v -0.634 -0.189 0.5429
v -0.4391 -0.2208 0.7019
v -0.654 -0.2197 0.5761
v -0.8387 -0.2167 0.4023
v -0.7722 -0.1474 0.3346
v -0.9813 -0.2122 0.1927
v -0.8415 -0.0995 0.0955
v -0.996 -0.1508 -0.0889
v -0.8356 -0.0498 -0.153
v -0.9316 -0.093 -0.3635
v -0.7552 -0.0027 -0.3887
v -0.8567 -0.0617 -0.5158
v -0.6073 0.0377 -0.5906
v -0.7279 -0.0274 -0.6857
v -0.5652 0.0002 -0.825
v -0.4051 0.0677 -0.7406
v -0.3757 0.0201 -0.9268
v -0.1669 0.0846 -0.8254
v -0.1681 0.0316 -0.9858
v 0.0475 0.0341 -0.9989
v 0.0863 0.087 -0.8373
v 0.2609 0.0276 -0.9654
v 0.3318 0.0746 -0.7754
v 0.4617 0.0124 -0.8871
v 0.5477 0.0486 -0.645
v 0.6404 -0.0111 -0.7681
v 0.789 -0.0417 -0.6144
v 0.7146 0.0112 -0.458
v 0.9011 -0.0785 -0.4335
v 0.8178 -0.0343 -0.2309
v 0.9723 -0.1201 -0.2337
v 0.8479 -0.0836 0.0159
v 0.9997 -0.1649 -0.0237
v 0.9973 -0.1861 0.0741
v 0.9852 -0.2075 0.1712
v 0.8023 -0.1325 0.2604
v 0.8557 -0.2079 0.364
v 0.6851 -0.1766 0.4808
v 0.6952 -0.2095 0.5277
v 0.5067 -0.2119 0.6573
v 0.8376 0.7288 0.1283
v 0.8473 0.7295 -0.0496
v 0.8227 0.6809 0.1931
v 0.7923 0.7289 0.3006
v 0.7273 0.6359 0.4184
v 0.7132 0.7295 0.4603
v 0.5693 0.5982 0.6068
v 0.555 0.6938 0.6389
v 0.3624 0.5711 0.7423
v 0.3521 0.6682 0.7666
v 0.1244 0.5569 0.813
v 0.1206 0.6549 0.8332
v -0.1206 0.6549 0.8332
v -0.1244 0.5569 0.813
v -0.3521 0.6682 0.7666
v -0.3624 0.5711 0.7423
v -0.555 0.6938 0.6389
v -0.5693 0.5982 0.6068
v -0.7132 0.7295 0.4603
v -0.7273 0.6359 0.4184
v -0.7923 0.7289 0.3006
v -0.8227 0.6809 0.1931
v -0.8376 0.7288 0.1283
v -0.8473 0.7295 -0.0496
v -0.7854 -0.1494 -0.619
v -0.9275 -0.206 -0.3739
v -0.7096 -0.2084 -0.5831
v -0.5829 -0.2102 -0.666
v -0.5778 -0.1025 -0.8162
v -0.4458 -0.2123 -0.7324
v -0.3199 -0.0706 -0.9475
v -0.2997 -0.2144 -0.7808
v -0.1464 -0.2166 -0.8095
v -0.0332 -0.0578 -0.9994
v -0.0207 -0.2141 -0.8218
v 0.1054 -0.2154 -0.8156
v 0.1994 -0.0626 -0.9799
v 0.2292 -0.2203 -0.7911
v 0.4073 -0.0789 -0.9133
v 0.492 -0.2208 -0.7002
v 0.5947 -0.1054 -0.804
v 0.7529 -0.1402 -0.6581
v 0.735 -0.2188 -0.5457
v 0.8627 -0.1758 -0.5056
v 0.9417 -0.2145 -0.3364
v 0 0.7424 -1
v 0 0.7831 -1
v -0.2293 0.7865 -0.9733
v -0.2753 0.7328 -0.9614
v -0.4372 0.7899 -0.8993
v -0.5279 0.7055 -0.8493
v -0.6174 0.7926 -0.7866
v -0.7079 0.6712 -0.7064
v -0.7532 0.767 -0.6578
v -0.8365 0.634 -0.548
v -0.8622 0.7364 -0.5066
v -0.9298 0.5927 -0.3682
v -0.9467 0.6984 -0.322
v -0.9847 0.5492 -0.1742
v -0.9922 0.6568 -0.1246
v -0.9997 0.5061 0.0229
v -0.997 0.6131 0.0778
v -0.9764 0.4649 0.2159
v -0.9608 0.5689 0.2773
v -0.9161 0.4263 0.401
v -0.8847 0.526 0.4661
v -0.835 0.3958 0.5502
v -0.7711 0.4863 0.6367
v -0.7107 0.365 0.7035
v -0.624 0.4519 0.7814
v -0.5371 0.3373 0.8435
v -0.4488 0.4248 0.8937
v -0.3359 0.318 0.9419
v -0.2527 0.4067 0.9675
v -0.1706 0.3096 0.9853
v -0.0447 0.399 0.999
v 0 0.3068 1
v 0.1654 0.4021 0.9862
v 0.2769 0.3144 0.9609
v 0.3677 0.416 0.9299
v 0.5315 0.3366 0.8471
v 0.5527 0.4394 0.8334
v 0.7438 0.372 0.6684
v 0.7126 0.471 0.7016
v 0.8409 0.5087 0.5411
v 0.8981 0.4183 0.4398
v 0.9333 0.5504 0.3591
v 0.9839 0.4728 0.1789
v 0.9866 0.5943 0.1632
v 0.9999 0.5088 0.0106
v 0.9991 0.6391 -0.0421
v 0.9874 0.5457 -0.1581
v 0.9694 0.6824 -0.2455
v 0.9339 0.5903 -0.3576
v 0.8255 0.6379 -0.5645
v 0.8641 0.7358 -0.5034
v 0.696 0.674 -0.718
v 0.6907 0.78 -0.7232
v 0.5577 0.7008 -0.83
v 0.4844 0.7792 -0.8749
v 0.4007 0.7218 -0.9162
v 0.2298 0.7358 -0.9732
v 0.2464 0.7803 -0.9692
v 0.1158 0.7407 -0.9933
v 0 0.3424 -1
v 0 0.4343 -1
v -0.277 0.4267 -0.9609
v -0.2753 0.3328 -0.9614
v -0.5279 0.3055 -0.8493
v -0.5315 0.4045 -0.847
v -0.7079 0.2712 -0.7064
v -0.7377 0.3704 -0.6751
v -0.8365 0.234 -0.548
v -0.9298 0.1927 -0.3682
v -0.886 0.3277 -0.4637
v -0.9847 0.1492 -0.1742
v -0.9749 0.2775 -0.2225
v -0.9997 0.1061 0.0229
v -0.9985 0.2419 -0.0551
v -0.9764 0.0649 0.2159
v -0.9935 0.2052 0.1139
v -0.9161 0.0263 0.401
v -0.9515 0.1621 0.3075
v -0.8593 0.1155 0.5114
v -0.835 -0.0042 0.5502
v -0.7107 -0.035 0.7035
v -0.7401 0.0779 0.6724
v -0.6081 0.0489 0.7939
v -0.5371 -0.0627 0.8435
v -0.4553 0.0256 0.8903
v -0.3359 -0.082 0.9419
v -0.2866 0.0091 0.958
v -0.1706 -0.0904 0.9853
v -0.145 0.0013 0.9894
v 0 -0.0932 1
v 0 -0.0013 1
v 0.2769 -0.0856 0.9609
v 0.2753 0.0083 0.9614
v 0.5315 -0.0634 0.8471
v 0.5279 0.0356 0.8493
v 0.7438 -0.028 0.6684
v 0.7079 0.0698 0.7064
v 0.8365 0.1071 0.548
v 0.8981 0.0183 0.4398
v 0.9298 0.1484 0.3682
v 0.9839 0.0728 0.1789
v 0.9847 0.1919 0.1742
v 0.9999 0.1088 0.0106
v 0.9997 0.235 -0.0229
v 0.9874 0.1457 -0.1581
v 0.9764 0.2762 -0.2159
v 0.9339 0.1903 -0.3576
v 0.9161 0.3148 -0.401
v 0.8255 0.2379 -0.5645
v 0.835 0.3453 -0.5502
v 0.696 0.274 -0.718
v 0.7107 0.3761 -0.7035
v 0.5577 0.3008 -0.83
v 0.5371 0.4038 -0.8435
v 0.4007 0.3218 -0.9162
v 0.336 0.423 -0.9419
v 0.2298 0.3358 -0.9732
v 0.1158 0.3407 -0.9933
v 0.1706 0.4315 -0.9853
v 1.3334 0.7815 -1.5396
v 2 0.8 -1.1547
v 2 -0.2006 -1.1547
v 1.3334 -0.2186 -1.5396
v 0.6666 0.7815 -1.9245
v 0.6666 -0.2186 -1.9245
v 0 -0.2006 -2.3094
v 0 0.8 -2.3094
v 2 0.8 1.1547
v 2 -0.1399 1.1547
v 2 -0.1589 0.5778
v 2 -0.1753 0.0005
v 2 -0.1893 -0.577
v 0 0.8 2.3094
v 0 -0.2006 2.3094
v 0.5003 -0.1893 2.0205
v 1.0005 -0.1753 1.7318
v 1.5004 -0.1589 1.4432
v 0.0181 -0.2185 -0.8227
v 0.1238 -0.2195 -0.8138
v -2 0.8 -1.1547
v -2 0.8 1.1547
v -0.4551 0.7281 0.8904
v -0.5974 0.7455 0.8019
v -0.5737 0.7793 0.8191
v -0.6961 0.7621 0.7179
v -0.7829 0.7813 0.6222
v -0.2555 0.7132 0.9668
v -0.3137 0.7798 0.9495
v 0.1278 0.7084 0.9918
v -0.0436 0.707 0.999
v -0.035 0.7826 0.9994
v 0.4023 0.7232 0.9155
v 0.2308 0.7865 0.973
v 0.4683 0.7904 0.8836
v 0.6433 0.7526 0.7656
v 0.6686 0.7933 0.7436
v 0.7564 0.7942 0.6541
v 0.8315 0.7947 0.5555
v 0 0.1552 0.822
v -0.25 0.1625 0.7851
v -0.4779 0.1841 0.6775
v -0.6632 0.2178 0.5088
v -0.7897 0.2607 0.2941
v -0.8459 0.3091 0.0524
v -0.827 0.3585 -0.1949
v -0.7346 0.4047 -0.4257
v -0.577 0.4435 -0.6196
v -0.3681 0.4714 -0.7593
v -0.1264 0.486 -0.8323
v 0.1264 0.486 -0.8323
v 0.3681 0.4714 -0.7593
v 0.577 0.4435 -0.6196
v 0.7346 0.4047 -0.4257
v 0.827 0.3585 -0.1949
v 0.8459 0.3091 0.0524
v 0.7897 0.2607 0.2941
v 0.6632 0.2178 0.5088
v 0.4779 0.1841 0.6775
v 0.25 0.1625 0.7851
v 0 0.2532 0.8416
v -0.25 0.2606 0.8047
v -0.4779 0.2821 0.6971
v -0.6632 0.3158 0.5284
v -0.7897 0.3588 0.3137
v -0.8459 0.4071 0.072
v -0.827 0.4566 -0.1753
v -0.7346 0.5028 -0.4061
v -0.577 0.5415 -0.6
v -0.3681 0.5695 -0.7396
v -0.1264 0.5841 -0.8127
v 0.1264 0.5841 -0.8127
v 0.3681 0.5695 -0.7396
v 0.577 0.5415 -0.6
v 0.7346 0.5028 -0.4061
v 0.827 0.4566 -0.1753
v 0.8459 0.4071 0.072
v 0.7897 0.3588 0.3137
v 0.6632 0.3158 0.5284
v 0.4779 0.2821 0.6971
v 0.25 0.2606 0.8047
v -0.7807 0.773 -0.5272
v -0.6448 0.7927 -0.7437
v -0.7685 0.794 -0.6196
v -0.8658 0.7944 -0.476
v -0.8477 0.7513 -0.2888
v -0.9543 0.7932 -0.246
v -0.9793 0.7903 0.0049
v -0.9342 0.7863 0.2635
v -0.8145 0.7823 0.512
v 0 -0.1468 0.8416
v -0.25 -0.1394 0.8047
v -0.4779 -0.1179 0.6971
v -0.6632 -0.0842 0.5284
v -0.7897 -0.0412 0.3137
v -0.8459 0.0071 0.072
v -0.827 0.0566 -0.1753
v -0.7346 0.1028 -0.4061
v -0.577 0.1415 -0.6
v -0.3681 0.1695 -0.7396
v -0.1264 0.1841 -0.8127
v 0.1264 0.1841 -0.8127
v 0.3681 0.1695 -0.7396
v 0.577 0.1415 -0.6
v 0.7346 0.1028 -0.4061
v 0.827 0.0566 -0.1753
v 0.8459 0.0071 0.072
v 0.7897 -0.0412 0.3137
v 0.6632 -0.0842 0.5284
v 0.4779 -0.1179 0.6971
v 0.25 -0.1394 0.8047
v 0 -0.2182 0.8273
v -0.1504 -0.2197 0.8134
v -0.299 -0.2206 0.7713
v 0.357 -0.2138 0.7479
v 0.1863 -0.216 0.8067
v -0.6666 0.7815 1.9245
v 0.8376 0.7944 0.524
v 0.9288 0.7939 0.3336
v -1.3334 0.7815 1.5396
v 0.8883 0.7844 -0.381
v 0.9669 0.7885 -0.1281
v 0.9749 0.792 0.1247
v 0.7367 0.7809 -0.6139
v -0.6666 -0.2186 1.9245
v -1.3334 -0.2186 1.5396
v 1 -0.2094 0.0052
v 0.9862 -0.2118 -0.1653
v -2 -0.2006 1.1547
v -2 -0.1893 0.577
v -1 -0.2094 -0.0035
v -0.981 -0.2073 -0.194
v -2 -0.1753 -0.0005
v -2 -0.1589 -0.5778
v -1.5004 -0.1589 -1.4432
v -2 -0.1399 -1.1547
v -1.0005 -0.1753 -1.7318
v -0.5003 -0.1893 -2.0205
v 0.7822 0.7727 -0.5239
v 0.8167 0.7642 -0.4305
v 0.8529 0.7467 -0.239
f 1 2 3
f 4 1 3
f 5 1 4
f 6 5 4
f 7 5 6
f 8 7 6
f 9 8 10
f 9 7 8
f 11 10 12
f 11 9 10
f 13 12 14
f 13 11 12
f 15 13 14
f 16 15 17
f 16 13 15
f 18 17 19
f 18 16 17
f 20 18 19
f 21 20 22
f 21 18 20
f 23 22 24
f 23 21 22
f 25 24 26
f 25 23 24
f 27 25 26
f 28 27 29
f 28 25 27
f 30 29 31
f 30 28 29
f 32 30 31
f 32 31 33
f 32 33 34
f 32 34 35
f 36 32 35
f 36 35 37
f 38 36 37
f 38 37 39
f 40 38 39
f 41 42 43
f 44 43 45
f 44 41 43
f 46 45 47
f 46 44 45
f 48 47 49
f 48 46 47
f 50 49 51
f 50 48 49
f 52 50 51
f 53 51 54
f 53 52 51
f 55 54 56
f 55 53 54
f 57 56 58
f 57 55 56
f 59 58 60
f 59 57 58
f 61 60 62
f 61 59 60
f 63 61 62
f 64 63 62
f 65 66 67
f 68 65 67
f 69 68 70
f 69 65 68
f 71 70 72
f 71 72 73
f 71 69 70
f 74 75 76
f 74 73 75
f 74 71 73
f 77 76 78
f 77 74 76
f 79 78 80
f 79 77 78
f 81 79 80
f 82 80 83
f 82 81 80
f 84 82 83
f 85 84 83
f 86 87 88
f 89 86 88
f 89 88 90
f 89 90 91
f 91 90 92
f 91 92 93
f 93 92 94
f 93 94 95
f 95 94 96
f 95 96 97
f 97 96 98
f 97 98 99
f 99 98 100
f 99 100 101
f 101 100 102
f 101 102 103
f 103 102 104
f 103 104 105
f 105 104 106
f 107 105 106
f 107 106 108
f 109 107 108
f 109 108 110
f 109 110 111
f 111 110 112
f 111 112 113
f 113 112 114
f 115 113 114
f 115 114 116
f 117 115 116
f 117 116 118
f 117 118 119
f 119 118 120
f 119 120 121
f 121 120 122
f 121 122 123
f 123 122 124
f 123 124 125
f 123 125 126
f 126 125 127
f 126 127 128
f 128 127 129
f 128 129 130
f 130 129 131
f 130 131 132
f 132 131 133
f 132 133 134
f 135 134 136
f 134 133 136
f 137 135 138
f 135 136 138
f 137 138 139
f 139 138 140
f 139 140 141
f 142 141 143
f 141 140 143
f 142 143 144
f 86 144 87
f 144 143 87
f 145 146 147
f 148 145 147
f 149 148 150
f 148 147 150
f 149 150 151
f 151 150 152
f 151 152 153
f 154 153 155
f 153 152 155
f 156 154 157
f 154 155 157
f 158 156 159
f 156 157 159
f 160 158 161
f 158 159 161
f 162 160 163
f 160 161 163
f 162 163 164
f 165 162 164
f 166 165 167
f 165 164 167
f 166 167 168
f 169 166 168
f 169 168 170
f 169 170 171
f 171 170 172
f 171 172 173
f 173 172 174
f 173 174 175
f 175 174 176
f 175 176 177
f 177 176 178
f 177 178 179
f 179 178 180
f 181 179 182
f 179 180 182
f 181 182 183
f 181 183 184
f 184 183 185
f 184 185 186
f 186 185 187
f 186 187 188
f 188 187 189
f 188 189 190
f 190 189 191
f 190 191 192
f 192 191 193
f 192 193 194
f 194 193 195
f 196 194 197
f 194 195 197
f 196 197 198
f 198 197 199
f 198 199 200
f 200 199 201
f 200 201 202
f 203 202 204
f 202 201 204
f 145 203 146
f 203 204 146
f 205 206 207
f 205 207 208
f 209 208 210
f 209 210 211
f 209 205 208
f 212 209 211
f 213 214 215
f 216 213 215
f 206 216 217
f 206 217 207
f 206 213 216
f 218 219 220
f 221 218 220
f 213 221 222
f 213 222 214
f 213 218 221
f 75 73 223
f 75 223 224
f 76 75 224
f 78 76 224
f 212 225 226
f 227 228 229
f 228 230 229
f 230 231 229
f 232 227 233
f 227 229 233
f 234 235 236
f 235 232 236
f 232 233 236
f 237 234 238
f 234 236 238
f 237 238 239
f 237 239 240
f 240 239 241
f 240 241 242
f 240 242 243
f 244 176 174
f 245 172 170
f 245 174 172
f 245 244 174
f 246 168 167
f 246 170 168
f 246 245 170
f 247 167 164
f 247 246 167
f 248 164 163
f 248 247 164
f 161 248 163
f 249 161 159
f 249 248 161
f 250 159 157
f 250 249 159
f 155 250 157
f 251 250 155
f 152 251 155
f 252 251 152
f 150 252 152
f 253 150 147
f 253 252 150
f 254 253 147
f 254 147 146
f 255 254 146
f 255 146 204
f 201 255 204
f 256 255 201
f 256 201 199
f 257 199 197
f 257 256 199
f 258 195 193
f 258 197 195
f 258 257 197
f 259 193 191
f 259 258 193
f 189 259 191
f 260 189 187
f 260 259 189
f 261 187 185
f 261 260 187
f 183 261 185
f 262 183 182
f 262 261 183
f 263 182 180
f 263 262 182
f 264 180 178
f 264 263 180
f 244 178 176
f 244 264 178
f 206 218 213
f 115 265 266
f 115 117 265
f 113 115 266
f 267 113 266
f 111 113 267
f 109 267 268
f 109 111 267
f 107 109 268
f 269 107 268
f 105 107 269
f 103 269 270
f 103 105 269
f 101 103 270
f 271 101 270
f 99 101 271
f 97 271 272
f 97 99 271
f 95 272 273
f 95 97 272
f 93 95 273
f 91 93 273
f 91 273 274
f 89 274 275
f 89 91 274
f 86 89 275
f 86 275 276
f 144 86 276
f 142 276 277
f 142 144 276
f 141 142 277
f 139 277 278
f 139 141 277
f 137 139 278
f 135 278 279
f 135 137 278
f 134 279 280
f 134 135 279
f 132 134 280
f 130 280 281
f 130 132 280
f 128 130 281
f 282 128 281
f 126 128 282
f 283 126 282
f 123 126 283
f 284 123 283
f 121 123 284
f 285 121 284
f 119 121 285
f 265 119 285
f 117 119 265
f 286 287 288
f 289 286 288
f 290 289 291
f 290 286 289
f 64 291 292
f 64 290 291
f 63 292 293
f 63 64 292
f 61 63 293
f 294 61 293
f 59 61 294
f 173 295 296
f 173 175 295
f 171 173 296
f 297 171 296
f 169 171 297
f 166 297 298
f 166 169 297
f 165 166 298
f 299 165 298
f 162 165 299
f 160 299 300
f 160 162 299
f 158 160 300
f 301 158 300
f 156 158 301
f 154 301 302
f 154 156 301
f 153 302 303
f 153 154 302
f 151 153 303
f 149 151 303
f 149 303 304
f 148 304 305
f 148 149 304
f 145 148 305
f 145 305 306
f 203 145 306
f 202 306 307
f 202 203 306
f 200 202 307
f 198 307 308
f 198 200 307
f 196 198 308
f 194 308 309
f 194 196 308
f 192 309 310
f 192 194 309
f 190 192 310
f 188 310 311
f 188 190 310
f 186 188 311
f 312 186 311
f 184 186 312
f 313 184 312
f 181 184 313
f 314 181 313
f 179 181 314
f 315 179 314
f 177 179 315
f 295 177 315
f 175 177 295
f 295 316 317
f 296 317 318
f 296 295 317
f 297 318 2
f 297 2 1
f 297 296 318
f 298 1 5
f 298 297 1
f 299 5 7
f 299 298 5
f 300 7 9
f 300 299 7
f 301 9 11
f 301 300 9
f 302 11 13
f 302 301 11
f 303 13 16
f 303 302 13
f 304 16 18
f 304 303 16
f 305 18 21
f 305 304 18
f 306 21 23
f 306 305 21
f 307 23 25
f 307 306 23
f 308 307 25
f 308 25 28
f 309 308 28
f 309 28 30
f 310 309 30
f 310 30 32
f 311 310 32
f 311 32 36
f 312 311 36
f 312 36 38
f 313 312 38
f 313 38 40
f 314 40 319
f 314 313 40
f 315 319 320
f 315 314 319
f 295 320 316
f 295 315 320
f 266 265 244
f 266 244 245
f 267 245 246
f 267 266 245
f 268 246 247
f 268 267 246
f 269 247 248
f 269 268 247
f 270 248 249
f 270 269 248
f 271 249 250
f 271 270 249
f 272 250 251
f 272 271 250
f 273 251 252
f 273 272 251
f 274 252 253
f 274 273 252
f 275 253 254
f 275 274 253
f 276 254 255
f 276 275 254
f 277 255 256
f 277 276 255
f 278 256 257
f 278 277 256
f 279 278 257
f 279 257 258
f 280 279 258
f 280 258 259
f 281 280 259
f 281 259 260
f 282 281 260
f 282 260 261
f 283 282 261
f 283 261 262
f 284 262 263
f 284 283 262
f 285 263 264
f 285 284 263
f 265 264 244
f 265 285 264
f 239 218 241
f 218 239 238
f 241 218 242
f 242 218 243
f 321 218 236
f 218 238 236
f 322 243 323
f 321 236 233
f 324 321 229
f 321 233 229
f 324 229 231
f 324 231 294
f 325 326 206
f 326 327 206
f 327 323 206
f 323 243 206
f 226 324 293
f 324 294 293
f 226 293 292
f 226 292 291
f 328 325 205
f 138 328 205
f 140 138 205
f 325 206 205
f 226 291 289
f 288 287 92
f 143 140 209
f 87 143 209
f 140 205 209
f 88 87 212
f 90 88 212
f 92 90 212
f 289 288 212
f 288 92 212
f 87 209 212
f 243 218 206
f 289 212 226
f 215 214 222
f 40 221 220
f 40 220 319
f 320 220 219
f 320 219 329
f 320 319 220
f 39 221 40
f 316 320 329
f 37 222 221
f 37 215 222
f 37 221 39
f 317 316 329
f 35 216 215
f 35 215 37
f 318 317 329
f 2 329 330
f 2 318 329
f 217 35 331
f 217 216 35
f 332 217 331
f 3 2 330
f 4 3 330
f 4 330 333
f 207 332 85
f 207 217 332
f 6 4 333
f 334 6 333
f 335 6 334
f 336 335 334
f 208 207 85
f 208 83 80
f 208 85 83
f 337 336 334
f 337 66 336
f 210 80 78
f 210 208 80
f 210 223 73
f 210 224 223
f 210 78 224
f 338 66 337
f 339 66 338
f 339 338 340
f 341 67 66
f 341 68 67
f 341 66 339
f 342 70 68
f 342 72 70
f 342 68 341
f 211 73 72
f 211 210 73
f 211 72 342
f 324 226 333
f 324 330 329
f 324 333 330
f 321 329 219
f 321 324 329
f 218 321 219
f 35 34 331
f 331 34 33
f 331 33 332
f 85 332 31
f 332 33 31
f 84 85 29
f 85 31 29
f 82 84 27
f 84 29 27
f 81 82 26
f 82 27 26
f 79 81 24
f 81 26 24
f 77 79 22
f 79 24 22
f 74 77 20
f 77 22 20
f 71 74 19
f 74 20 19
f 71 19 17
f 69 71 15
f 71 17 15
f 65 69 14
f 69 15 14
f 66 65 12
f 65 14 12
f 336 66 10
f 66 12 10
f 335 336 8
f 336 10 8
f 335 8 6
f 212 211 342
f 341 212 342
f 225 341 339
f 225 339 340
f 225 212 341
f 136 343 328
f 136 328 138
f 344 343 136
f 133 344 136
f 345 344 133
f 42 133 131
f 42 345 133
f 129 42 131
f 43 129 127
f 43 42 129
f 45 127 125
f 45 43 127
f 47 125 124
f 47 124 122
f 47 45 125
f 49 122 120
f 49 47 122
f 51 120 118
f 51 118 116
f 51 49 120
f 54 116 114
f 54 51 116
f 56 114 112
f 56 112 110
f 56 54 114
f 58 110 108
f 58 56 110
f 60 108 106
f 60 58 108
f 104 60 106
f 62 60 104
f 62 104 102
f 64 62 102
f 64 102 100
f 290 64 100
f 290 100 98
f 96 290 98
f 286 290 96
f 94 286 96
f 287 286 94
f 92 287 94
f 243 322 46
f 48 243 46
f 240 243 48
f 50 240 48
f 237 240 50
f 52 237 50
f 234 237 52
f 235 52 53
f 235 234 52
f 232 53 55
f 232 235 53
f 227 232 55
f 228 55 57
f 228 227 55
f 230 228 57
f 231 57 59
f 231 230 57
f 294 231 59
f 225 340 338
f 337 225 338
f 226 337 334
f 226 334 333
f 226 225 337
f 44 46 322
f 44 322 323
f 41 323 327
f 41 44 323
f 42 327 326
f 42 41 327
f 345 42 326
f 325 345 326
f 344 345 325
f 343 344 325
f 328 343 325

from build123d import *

# Parameters (mm, degrees)
EXTRUDE1_DEPTH      = 0.8
SKETCH2_W           = 1
SKETCH2_H           = 1.6
LPATTERN1_COUNT     = 4
LPATTERN1_PITCH     = 0.4
LPATTERN1_COL_COUNT = 2
LPATTERN1_COL_PITCH = 0.4
CUT_EXTRUDE1_DEPTH  = 10


with BuildPart() as part:
    # Sketch1 → Extrude1 (new, symmetric)
    with BuildSketch(Plane(origin=(0, 0, 0), x_dir=(1, 0, 0), z_dir=(0, 1, 0))):
        Polygon((0, 2.309401077), (-2, 1.154700538), (-2, -1.154700538), (0, -2.309401077), (2, -1.154700538), (2, 1.154700538), align=None)
    extrude(amount=EXTRUDE1_DEPTH, both=True)

    # Sketch4 → Cut-Revolve2 (revolve, cut)
    with BuildSketch(Plane(origin=(0, 0, 0), x_dir=(0, 0, -1), z_dir=(1, 0, 0))):
        Polygon((0, 0.8), (1, 0.8), (0.82201838, 0.717005807), (0.82201838, -0.717005807), (1, -0.8), (0, -0.8), align=None)
    revolve(axis=Axis((0, 0.8, 0), (0, 1, 0)), mode=Mode.SUBTRACT)


with BuildPart() as body_2:
    # Sketch2 → Revolve1 (revolve)
    with BuildSketch(Plane(origin=(0, 0, 0), x_dir=(0, 0, -1), z_dir=(1, 0, 0))):
        with Locations((0.5, 0)):
            Rectangle(SKETCH2_W, SKETCH2_H)
    revolve(axis=Axis((0, -1.8, 0), (0, 1, 0)))

    # Sketch3 → Cut-Revolve1 (revolve, cut)
    with BuildSketch(Plane(origin=(0, 0, 0), x_dir=(0, 0, -1), z_dir=(1, 0, 0)), mode=Mode.PRIVATE) as cut_revolve1_sk:
        Polygon((1.009805807, 0.750970966), (1.078446454, 0.40776773), (0.841629993, 0.487879925), (0.82201838, 0.585937993), align=None)
    cut_revolve1 = revolve(cut_revolve1_sk.sketch.rotate(Axis((0, 0.8, 0.085891176), (0, -0.9805806756909201, -0.19611613513818416)), 180), axis=Axis((0, 0.8, 0.085891176), (0, -0.9805806756909201, -0.19611613513818416)), mode=Mode.SUBTRACT)

    # LPattern1: Cut-Revolve1 ×4
    with Locations(*[(0, -i * LPATTERN1_PITCH, 0) for i in range(1, LPATTERN1_COUNT)]):
        add(cut_revolve1, mode=Mode.SUBTRACT)

    # LPattern1 col: Cut-Revolve1 ×2
    with Locations(*[(0, i * LPATTERN1_COL_PITCH, 0) for i in range(1, LPATTERN1_COL_COUNT)]):
        add(cut_revolve1, mode=Mode.SUBTRACT)


with BuildPart() as part_1:
    add(part.part)

    # Combine1: cut body 2
    add(body_2.part, mode=Mode.SUBTRACT)

    # Sketch8 → Cut-Extrude1 (cut)
    with BuildSketch(Plane(origin=(1, 0, -1.732050808), x_dir=(-0.8660254037844387, 0, -0.49999999999999983), z_dir=(0.49999999999999983, 0, -0.8660254037844387))):
        with BuildLine():
            ThreePointArc((-9.370997107, 2.18202908), (0, 0.779159881), (9.370997107, 2.18202908))
            add(Edge.make_bspline(
                [(9.370997107, 2.18202908), (-0.379082197, 7.669320015), (-9.370997107, 2.18202908)],
                knots=[0, 0, 0, 1, 1, 1], degree=2))
        make_face()
        with BuildLine():
            ThreePointArc((-10.64516129, 1.54327441), (0, -0.220840119), (10.64516129, 1.54327441))
            add(Edge.make_bspline(
                [(10.64516129, 1.54327441), (-0.0817748, -7.501419358), (-10.64516129, 1.54327441)],
                knots=[0, 0, 0, 1, 1, 1], degree=2))
        make_face()
    extrude(amount=-CUT_EXTRUDE1_DEPTH, mode=Mode.SUBTRACT)


solid = part_1.part
